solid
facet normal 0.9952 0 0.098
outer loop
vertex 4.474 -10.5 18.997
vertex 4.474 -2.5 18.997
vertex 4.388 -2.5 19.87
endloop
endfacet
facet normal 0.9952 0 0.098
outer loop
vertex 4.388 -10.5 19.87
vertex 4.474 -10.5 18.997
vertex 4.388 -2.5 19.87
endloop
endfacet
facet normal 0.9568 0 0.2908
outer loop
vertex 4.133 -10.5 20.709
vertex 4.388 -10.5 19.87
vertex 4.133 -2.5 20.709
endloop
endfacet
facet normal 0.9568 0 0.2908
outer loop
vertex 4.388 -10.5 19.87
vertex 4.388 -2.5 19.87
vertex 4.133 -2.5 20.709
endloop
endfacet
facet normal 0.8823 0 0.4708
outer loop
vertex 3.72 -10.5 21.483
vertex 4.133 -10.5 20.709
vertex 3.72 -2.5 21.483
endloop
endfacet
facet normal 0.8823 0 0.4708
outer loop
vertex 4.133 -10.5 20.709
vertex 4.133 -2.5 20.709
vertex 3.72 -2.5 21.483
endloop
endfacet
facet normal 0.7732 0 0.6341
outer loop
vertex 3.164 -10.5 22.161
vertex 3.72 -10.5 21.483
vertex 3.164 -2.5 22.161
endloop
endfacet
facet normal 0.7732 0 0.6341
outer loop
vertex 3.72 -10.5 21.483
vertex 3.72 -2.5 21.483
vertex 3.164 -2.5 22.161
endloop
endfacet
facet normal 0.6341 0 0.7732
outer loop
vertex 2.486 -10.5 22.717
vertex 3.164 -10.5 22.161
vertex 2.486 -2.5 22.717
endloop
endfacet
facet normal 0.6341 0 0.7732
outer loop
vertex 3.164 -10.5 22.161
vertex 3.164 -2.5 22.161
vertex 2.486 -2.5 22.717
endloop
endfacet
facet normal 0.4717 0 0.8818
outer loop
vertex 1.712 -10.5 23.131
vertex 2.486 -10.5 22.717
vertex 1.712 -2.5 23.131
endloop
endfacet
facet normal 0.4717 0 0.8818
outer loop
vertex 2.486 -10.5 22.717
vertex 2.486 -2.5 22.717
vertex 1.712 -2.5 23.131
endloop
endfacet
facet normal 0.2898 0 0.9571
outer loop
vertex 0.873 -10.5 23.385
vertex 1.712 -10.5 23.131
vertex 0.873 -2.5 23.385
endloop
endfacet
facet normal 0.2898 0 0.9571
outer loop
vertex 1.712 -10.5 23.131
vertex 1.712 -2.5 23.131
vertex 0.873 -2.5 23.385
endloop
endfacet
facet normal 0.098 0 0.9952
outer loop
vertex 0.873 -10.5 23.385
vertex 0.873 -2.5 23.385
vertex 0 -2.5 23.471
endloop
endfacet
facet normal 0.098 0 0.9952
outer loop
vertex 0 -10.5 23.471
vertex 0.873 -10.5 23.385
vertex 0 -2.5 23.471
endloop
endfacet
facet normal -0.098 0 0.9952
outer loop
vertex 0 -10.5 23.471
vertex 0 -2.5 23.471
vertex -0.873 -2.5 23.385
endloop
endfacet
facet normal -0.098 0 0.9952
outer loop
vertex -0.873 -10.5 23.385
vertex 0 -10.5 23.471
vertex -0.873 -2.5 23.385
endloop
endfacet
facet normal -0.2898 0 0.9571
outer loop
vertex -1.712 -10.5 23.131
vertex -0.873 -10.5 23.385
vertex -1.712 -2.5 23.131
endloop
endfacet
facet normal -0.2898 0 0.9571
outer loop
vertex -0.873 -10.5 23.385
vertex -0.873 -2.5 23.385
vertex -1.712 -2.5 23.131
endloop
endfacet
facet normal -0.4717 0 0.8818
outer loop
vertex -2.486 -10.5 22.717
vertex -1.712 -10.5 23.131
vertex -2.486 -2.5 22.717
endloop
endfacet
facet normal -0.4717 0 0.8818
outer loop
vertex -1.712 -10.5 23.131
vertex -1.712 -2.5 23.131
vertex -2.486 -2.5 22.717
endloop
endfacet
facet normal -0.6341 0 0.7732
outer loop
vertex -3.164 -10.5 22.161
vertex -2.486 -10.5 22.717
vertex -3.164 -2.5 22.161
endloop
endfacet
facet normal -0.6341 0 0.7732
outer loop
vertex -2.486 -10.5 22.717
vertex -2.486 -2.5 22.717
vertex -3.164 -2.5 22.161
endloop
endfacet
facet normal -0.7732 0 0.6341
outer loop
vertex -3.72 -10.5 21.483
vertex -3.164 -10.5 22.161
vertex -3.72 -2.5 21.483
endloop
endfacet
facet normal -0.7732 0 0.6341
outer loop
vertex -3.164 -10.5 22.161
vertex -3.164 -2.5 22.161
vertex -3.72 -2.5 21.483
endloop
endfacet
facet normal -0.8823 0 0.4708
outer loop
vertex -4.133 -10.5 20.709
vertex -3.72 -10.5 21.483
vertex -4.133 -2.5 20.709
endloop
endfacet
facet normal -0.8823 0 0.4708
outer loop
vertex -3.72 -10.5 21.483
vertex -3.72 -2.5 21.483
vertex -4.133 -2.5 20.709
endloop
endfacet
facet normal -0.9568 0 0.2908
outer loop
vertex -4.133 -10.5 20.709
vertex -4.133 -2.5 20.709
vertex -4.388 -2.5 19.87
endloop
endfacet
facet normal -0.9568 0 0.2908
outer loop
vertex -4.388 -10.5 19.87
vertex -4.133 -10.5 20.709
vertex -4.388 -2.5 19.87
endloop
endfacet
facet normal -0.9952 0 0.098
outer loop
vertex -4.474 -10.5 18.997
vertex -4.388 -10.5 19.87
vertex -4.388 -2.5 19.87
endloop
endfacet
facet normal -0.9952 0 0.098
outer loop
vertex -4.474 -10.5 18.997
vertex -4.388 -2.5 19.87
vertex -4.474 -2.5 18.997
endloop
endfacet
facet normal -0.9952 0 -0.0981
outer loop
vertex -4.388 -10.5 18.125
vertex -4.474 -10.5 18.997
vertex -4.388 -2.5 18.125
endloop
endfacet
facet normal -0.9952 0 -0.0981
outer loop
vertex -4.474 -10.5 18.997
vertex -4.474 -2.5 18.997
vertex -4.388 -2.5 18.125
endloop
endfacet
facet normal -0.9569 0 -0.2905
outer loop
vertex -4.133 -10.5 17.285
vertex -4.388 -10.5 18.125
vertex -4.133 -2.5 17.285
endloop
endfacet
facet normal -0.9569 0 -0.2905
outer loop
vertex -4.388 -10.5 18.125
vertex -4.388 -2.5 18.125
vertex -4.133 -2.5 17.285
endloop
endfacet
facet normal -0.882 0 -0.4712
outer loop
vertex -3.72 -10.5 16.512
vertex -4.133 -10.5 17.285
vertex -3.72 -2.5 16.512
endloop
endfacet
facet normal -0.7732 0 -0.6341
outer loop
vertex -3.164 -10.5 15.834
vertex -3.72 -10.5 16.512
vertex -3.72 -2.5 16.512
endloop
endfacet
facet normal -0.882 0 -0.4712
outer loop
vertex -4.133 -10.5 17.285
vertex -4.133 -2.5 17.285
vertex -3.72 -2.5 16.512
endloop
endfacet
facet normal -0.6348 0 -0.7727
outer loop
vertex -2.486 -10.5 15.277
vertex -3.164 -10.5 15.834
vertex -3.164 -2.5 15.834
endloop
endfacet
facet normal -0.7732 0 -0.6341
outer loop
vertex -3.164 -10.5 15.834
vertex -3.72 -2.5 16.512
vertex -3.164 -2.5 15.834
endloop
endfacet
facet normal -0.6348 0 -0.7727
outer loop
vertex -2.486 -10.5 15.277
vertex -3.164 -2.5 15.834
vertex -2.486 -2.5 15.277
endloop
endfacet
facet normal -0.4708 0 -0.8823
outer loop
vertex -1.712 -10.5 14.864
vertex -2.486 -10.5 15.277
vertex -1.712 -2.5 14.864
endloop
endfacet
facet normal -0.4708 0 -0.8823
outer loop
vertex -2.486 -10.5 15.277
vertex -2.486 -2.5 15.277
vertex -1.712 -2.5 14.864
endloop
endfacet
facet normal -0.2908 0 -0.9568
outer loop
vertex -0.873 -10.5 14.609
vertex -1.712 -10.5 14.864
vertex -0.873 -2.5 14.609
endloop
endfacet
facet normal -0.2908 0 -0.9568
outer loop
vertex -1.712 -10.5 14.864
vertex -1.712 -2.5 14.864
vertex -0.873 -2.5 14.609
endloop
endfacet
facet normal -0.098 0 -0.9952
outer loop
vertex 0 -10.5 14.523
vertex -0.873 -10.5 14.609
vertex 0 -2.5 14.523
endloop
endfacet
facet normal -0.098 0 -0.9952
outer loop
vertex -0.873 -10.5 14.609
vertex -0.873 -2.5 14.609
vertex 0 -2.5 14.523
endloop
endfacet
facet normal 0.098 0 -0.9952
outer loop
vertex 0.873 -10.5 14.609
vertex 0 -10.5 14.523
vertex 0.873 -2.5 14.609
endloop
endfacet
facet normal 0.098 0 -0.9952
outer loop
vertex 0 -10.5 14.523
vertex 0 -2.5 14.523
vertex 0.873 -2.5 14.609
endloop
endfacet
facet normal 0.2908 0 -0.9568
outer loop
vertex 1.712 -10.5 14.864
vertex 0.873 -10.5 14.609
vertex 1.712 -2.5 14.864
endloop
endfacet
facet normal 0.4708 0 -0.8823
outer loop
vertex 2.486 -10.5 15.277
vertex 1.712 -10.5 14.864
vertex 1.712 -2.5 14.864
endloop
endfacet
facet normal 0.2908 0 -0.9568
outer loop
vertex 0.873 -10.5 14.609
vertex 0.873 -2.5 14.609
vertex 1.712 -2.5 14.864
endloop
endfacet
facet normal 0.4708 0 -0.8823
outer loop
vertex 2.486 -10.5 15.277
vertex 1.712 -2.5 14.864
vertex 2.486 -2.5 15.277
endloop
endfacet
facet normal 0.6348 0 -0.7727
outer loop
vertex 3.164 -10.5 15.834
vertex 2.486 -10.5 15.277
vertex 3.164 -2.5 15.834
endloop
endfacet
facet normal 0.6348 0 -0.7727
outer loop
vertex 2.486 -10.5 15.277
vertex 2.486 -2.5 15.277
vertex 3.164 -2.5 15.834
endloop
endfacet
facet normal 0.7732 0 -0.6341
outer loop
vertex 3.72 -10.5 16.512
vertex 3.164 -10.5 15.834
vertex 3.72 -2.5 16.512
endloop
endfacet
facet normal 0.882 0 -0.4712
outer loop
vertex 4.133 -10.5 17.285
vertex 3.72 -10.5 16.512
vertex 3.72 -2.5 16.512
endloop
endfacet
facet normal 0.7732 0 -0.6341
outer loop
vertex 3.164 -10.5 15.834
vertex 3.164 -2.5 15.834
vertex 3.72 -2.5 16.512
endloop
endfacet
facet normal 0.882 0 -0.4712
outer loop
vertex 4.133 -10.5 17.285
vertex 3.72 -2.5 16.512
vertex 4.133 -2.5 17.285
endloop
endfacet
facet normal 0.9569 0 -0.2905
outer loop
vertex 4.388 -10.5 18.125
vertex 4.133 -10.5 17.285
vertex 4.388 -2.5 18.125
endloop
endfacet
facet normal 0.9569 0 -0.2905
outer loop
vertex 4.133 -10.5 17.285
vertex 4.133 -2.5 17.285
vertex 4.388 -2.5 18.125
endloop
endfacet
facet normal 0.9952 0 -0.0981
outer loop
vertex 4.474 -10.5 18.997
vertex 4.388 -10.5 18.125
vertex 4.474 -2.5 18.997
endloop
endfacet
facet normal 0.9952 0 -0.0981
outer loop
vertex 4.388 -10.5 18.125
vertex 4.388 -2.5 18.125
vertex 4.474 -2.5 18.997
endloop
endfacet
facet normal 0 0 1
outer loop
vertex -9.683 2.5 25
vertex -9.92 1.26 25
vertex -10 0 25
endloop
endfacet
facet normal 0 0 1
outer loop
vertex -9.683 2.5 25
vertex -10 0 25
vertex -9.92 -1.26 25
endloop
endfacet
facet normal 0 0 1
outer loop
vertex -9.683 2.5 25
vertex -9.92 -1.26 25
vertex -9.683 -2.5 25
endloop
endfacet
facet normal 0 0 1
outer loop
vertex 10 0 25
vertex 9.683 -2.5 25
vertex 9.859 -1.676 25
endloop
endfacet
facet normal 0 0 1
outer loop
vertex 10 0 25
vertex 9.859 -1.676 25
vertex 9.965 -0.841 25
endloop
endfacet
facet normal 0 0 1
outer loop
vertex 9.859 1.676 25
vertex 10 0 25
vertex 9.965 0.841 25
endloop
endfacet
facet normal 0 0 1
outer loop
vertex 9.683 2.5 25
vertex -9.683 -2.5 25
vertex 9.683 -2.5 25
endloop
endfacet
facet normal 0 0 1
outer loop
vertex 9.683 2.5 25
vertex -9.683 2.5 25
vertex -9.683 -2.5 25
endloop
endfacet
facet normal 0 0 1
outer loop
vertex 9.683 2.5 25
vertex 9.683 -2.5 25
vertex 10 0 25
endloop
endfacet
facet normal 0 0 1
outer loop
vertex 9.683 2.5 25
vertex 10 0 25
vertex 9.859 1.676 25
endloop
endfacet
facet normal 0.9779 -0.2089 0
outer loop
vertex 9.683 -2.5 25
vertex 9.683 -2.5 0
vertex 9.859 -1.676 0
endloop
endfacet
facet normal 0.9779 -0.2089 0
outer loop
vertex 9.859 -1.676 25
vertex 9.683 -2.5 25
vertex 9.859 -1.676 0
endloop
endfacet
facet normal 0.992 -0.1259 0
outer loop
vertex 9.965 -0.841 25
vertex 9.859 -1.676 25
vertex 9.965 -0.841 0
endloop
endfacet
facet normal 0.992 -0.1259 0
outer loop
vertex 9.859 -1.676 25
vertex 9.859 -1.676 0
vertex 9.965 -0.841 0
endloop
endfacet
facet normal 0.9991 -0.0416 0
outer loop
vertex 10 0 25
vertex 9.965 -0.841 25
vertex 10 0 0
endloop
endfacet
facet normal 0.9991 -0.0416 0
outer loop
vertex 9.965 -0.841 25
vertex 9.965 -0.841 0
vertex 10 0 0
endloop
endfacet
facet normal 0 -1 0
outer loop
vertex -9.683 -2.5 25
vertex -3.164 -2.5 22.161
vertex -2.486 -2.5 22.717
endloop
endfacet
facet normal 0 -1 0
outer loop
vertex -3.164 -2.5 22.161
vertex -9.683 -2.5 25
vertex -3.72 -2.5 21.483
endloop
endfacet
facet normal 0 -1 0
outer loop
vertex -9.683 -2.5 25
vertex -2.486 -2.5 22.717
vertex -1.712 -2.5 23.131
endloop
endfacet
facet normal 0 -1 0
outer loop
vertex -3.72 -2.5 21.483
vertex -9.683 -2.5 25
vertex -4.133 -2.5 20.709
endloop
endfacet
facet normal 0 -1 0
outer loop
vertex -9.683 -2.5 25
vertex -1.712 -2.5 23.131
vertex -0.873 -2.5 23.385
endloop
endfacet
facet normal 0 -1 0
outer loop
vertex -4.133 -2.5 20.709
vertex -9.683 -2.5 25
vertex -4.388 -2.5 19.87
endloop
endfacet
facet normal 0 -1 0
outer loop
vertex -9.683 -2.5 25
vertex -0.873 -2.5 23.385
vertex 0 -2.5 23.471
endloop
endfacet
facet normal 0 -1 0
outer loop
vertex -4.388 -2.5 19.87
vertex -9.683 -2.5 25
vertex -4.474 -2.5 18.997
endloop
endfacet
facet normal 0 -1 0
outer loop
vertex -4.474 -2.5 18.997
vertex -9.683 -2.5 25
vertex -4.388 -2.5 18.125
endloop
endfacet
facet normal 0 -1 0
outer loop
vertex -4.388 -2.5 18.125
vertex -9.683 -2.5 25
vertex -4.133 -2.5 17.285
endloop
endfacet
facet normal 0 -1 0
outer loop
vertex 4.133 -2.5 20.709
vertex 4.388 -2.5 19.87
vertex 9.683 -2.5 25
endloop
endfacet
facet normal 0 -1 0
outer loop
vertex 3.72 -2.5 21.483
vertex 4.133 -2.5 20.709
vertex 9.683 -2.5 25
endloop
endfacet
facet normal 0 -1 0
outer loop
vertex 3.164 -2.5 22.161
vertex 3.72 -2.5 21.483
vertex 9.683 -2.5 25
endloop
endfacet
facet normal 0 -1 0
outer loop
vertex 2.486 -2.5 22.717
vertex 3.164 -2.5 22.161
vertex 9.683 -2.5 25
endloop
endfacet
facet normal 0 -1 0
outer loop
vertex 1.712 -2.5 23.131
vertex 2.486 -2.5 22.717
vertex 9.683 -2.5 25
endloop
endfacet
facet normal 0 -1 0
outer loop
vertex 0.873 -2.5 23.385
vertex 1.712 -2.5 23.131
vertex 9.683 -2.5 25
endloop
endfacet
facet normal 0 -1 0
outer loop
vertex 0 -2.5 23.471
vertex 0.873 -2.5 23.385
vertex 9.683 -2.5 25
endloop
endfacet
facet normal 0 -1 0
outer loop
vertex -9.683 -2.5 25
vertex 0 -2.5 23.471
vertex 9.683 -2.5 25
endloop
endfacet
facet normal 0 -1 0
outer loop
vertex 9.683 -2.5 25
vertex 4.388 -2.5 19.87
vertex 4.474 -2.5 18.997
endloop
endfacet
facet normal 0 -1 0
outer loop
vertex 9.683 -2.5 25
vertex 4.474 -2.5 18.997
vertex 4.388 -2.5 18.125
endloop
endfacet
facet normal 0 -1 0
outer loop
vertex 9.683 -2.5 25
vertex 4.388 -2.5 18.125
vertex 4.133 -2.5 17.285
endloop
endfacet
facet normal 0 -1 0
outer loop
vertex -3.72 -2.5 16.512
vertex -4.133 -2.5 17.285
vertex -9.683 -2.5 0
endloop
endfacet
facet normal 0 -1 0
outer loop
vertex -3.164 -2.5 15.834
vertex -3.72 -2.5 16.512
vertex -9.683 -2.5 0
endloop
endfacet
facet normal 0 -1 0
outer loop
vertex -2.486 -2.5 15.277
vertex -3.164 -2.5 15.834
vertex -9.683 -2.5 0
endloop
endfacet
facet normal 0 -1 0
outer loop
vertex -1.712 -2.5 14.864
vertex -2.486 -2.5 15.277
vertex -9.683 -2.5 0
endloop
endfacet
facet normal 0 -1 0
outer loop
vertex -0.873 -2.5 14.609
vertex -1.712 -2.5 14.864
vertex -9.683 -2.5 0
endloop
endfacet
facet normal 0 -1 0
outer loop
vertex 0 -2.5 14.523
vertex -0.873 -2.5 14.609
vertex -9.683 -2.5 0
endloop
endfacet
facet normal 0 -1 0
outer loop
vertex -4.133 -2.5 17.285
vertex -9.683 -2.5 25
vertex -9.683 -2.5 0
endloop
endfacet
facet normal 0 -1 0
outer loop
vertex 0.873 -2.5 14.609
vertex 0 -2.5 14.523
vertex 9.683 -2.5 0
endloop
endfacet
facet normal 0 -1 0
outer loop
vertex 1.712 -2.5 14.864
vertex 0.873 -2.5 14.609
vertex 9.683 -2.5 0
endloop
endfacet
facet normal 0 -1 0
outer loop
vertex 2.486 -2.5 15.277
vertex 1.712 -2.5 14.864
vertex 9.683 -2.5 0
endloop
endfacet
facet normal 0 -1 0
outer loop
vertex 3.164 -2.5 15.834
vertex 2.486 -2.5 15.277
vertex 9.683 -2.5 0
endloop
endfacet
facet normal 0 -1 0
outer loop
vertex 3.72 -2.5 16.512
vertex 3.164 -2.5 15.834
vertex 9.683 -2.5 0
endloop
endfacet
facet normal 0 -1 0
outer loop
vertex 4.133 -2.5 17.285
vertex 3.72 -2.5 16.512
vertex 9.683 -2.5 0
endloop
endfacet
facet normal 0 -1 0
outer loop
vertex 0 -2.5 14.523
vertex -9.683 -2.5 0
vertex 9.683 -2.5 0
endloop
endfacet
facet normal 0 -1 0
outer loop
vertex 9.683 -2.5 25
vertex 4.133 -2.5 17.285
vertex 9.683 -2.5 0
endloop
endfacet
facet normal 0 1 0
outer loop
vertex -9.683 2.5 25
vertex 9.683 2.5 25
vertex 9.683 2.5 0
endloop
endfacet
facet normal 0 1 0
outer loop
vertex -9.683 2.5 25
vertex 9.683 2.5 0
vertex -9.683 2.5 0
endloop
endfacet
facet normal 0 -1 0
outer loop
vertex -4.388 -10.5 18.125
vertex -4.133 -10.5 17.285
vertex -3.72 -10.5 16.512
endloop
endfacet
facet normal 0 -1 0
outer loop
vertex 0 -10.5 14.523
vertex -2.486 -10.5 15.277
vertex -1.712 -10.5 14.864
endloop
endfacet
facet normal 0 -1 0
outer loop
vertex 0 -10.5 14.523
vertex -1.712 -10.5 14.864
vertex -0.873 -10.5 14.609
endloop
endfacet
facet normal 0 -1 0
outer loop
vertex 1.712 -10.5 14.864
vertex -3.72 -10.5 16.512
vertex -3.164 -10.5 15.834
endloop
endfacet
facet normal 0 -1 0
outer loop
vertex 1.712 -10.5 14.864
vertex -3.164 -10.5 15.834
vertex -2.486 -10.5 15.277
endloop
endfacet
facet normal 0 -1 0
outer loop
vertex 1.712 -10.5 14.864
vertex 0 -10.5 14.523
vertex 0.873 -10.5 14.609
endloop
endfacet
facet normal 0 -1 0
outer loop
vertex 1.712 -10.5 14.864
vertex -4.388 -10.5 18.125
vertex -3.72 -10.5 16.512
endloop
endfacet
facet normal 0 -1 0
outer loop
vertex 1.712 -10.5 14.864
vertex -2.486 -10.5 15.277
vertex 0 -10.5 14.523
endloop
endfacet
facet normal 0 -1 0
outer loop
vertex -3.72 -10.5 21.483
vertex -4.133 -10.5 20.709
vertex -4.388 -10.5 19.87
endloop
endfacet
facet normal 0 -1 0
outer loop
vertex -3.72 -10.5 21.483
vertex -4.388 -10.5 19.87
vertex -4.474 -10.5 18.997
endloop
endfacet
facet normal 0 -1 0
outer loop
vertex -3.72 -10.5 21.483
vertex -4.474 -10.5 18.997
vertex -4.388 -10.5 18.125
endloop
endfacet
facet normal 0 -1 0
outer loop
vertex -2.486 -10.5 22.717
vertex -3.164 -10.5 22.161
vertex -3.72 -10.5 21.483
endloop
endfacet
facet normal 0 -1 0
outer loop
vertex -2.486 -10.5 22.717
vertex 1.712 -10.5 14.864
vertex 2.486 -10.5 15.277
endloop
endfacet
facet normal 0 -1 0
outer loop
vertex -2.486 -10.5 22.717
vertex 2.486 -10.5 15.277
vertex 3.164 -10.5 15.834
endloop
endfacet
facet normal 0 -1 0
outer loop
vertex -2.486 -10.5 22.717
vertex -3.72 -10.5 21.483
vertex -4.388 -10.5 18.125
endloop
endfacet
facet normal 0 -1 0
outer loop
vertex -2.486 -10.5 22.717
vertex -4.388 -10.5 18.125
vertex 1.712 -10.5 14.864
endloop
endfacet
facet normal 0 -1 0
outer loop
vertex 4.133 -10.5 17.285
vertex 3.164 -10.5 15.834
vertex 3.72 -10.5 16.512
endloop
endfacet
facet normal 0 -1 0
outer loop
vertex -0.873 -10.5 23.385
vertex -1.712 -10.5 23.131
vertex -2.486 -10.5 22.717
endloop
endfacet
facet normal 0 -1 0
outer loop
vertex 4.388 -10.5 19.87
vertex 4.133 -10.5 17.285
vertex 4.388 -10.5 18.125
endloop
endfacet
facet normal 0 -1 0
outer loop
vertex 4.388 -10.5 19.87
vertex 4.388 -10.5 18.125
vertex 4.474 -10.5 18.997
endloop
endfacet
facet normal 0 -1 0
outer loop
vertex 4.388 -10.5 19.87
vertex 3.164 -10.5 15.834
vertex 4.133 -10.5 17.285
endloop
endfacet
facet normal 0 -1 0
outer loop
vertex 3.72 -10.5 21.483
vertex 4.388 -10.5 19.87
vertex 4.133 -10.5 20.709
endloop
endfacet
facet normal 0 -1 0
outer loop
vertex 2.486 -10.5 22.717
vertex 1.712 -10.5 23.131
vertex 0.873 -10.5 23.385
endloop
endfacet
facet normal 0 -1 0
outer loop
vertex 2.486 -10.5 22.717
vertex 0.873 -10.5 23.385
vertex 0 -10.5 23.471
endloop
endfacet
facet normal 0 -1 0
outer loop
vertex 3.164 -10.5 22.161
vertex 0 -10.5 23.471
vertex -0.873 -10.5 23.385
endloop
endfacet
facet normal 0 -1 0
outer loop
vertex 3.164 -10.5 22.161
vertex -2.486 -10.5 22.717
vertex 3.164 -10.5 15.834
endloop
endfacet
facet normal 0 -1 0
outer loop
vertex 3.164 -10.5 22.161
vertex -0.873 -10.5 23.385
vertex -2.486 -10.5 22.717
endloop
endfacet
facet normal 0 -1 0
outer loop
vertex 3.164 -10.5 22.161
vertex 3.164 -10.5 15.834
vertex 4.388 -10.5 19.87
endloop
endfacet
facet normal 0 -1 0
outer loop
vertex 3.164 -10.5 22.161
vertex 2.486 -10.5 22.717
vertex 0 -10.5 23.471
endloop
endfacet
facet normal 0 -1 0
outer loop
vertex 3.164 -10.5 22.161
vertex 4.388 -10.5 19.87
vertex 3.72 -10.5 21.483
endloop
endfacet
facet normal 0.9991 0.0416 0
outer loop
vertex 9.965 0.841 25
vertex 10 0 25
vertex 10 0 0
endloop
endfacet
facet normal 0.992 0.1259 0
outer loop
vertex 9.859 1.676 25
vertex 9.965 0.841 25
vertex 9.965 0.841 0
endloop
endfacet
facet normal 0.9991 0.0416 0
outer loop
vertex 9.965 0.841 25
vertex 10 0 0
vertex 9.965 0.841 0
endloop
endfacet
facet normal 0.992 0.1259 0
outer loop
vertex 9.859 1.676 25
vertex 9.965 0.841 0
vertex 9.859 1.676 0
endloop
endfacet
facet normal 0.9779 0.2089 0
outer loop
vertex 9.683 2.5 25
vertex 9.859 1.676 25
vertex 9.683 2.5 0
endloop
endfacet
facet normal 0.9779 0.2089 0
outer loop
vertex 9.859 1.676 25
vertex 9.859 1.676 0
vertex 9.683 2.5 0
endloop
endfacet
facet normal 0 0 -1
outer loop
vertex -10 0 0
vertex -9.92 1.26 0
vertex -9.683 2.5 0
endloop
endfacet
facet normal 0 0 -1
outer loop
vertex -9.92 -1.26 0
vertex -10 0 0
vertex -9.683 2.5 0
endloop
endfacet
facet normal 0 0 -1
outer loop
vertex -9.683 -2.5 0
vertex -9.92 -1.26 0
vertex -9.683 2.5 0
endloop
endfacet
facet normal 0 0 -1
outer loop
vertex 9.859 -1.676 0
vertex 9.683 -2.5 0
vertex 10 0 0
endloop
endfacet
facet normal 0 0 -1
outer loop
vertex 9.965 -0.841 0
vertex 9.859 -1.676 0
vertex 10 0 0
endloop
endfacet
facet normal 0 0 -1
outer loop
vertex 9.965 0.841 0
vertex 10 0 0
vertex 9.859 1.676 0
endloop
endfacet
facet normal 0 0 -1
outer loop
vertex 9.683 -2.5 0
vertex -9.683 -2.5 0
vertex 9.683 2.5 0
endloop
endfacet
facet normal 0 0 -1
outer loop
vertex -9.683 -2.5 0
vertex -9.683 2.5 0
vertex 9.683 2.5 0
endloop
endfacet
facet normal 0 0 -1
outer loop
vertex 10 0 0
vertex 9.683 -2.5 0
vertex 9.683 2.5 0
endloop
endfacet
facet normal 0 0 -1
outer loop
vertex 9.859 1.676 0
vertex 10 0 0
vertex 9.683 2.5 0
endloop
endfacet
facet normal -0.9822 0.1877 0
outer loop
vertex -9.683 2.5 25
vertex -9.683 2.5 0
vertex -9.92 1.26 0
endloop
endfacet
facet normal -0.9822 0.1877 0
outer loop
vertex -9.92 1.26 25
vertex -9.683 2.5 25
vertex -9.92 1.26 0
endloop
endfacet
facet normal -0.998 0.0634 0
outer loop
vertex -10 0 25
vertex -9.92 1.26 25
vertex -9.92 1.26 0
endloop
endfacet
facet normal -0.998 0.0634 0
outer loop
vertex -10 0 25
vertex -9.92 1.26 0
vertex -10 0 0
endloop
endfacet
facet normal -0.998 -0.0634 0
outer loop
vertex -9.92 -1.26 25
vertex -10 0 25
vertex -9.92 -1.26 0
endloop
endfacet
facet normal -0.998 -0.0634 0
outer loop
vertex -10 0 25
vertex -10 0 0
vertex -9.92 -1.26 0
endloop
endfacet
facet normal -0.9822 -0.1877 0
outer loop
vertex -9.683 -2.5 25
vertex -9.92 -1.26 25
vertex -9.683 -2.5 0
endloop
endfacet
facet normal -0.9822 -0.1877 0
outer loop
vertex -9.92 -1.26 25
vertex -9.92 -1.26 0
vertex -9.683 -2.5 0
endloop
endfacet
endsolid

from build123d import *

# Parameters (mm, degrees)
F1_DEPTH = 25
F2_R     = 4.473976
F3_DEPTH = 8


with BuildPart() as f1:
    # F0 (on Top) → F1 (new body)
    with BuildSketch(Plane.XY):
        with BuildLine():
            ThreePointArc((9.682585, -2.499508), (9.920329, -1.259791), (10, 0))
            ThreePointArc((10, 0), (9.920329, 1.259791), (9.682585, 2.499508))
            Line((9.682585, 2.499508), (-9.682585, 2.499508))
            ThreePointArc((-9.682585, 2.499508), (-10, 0), (-9.682585, -2.499508))
            Line((-9.682585, -2.499508), (9.682585, -2.499508))
        make_face()
    extrude(amount=F1_DEPTH)

    # F2 (on face) → F3 (join)
    with BuildSketch(Plane.XZ.offset(2.499508)):
        with Locations((0, 18.997351)):
            Circle(F2_R)
    extrude(amount=F3_DEPTH)


solid = f1.part
